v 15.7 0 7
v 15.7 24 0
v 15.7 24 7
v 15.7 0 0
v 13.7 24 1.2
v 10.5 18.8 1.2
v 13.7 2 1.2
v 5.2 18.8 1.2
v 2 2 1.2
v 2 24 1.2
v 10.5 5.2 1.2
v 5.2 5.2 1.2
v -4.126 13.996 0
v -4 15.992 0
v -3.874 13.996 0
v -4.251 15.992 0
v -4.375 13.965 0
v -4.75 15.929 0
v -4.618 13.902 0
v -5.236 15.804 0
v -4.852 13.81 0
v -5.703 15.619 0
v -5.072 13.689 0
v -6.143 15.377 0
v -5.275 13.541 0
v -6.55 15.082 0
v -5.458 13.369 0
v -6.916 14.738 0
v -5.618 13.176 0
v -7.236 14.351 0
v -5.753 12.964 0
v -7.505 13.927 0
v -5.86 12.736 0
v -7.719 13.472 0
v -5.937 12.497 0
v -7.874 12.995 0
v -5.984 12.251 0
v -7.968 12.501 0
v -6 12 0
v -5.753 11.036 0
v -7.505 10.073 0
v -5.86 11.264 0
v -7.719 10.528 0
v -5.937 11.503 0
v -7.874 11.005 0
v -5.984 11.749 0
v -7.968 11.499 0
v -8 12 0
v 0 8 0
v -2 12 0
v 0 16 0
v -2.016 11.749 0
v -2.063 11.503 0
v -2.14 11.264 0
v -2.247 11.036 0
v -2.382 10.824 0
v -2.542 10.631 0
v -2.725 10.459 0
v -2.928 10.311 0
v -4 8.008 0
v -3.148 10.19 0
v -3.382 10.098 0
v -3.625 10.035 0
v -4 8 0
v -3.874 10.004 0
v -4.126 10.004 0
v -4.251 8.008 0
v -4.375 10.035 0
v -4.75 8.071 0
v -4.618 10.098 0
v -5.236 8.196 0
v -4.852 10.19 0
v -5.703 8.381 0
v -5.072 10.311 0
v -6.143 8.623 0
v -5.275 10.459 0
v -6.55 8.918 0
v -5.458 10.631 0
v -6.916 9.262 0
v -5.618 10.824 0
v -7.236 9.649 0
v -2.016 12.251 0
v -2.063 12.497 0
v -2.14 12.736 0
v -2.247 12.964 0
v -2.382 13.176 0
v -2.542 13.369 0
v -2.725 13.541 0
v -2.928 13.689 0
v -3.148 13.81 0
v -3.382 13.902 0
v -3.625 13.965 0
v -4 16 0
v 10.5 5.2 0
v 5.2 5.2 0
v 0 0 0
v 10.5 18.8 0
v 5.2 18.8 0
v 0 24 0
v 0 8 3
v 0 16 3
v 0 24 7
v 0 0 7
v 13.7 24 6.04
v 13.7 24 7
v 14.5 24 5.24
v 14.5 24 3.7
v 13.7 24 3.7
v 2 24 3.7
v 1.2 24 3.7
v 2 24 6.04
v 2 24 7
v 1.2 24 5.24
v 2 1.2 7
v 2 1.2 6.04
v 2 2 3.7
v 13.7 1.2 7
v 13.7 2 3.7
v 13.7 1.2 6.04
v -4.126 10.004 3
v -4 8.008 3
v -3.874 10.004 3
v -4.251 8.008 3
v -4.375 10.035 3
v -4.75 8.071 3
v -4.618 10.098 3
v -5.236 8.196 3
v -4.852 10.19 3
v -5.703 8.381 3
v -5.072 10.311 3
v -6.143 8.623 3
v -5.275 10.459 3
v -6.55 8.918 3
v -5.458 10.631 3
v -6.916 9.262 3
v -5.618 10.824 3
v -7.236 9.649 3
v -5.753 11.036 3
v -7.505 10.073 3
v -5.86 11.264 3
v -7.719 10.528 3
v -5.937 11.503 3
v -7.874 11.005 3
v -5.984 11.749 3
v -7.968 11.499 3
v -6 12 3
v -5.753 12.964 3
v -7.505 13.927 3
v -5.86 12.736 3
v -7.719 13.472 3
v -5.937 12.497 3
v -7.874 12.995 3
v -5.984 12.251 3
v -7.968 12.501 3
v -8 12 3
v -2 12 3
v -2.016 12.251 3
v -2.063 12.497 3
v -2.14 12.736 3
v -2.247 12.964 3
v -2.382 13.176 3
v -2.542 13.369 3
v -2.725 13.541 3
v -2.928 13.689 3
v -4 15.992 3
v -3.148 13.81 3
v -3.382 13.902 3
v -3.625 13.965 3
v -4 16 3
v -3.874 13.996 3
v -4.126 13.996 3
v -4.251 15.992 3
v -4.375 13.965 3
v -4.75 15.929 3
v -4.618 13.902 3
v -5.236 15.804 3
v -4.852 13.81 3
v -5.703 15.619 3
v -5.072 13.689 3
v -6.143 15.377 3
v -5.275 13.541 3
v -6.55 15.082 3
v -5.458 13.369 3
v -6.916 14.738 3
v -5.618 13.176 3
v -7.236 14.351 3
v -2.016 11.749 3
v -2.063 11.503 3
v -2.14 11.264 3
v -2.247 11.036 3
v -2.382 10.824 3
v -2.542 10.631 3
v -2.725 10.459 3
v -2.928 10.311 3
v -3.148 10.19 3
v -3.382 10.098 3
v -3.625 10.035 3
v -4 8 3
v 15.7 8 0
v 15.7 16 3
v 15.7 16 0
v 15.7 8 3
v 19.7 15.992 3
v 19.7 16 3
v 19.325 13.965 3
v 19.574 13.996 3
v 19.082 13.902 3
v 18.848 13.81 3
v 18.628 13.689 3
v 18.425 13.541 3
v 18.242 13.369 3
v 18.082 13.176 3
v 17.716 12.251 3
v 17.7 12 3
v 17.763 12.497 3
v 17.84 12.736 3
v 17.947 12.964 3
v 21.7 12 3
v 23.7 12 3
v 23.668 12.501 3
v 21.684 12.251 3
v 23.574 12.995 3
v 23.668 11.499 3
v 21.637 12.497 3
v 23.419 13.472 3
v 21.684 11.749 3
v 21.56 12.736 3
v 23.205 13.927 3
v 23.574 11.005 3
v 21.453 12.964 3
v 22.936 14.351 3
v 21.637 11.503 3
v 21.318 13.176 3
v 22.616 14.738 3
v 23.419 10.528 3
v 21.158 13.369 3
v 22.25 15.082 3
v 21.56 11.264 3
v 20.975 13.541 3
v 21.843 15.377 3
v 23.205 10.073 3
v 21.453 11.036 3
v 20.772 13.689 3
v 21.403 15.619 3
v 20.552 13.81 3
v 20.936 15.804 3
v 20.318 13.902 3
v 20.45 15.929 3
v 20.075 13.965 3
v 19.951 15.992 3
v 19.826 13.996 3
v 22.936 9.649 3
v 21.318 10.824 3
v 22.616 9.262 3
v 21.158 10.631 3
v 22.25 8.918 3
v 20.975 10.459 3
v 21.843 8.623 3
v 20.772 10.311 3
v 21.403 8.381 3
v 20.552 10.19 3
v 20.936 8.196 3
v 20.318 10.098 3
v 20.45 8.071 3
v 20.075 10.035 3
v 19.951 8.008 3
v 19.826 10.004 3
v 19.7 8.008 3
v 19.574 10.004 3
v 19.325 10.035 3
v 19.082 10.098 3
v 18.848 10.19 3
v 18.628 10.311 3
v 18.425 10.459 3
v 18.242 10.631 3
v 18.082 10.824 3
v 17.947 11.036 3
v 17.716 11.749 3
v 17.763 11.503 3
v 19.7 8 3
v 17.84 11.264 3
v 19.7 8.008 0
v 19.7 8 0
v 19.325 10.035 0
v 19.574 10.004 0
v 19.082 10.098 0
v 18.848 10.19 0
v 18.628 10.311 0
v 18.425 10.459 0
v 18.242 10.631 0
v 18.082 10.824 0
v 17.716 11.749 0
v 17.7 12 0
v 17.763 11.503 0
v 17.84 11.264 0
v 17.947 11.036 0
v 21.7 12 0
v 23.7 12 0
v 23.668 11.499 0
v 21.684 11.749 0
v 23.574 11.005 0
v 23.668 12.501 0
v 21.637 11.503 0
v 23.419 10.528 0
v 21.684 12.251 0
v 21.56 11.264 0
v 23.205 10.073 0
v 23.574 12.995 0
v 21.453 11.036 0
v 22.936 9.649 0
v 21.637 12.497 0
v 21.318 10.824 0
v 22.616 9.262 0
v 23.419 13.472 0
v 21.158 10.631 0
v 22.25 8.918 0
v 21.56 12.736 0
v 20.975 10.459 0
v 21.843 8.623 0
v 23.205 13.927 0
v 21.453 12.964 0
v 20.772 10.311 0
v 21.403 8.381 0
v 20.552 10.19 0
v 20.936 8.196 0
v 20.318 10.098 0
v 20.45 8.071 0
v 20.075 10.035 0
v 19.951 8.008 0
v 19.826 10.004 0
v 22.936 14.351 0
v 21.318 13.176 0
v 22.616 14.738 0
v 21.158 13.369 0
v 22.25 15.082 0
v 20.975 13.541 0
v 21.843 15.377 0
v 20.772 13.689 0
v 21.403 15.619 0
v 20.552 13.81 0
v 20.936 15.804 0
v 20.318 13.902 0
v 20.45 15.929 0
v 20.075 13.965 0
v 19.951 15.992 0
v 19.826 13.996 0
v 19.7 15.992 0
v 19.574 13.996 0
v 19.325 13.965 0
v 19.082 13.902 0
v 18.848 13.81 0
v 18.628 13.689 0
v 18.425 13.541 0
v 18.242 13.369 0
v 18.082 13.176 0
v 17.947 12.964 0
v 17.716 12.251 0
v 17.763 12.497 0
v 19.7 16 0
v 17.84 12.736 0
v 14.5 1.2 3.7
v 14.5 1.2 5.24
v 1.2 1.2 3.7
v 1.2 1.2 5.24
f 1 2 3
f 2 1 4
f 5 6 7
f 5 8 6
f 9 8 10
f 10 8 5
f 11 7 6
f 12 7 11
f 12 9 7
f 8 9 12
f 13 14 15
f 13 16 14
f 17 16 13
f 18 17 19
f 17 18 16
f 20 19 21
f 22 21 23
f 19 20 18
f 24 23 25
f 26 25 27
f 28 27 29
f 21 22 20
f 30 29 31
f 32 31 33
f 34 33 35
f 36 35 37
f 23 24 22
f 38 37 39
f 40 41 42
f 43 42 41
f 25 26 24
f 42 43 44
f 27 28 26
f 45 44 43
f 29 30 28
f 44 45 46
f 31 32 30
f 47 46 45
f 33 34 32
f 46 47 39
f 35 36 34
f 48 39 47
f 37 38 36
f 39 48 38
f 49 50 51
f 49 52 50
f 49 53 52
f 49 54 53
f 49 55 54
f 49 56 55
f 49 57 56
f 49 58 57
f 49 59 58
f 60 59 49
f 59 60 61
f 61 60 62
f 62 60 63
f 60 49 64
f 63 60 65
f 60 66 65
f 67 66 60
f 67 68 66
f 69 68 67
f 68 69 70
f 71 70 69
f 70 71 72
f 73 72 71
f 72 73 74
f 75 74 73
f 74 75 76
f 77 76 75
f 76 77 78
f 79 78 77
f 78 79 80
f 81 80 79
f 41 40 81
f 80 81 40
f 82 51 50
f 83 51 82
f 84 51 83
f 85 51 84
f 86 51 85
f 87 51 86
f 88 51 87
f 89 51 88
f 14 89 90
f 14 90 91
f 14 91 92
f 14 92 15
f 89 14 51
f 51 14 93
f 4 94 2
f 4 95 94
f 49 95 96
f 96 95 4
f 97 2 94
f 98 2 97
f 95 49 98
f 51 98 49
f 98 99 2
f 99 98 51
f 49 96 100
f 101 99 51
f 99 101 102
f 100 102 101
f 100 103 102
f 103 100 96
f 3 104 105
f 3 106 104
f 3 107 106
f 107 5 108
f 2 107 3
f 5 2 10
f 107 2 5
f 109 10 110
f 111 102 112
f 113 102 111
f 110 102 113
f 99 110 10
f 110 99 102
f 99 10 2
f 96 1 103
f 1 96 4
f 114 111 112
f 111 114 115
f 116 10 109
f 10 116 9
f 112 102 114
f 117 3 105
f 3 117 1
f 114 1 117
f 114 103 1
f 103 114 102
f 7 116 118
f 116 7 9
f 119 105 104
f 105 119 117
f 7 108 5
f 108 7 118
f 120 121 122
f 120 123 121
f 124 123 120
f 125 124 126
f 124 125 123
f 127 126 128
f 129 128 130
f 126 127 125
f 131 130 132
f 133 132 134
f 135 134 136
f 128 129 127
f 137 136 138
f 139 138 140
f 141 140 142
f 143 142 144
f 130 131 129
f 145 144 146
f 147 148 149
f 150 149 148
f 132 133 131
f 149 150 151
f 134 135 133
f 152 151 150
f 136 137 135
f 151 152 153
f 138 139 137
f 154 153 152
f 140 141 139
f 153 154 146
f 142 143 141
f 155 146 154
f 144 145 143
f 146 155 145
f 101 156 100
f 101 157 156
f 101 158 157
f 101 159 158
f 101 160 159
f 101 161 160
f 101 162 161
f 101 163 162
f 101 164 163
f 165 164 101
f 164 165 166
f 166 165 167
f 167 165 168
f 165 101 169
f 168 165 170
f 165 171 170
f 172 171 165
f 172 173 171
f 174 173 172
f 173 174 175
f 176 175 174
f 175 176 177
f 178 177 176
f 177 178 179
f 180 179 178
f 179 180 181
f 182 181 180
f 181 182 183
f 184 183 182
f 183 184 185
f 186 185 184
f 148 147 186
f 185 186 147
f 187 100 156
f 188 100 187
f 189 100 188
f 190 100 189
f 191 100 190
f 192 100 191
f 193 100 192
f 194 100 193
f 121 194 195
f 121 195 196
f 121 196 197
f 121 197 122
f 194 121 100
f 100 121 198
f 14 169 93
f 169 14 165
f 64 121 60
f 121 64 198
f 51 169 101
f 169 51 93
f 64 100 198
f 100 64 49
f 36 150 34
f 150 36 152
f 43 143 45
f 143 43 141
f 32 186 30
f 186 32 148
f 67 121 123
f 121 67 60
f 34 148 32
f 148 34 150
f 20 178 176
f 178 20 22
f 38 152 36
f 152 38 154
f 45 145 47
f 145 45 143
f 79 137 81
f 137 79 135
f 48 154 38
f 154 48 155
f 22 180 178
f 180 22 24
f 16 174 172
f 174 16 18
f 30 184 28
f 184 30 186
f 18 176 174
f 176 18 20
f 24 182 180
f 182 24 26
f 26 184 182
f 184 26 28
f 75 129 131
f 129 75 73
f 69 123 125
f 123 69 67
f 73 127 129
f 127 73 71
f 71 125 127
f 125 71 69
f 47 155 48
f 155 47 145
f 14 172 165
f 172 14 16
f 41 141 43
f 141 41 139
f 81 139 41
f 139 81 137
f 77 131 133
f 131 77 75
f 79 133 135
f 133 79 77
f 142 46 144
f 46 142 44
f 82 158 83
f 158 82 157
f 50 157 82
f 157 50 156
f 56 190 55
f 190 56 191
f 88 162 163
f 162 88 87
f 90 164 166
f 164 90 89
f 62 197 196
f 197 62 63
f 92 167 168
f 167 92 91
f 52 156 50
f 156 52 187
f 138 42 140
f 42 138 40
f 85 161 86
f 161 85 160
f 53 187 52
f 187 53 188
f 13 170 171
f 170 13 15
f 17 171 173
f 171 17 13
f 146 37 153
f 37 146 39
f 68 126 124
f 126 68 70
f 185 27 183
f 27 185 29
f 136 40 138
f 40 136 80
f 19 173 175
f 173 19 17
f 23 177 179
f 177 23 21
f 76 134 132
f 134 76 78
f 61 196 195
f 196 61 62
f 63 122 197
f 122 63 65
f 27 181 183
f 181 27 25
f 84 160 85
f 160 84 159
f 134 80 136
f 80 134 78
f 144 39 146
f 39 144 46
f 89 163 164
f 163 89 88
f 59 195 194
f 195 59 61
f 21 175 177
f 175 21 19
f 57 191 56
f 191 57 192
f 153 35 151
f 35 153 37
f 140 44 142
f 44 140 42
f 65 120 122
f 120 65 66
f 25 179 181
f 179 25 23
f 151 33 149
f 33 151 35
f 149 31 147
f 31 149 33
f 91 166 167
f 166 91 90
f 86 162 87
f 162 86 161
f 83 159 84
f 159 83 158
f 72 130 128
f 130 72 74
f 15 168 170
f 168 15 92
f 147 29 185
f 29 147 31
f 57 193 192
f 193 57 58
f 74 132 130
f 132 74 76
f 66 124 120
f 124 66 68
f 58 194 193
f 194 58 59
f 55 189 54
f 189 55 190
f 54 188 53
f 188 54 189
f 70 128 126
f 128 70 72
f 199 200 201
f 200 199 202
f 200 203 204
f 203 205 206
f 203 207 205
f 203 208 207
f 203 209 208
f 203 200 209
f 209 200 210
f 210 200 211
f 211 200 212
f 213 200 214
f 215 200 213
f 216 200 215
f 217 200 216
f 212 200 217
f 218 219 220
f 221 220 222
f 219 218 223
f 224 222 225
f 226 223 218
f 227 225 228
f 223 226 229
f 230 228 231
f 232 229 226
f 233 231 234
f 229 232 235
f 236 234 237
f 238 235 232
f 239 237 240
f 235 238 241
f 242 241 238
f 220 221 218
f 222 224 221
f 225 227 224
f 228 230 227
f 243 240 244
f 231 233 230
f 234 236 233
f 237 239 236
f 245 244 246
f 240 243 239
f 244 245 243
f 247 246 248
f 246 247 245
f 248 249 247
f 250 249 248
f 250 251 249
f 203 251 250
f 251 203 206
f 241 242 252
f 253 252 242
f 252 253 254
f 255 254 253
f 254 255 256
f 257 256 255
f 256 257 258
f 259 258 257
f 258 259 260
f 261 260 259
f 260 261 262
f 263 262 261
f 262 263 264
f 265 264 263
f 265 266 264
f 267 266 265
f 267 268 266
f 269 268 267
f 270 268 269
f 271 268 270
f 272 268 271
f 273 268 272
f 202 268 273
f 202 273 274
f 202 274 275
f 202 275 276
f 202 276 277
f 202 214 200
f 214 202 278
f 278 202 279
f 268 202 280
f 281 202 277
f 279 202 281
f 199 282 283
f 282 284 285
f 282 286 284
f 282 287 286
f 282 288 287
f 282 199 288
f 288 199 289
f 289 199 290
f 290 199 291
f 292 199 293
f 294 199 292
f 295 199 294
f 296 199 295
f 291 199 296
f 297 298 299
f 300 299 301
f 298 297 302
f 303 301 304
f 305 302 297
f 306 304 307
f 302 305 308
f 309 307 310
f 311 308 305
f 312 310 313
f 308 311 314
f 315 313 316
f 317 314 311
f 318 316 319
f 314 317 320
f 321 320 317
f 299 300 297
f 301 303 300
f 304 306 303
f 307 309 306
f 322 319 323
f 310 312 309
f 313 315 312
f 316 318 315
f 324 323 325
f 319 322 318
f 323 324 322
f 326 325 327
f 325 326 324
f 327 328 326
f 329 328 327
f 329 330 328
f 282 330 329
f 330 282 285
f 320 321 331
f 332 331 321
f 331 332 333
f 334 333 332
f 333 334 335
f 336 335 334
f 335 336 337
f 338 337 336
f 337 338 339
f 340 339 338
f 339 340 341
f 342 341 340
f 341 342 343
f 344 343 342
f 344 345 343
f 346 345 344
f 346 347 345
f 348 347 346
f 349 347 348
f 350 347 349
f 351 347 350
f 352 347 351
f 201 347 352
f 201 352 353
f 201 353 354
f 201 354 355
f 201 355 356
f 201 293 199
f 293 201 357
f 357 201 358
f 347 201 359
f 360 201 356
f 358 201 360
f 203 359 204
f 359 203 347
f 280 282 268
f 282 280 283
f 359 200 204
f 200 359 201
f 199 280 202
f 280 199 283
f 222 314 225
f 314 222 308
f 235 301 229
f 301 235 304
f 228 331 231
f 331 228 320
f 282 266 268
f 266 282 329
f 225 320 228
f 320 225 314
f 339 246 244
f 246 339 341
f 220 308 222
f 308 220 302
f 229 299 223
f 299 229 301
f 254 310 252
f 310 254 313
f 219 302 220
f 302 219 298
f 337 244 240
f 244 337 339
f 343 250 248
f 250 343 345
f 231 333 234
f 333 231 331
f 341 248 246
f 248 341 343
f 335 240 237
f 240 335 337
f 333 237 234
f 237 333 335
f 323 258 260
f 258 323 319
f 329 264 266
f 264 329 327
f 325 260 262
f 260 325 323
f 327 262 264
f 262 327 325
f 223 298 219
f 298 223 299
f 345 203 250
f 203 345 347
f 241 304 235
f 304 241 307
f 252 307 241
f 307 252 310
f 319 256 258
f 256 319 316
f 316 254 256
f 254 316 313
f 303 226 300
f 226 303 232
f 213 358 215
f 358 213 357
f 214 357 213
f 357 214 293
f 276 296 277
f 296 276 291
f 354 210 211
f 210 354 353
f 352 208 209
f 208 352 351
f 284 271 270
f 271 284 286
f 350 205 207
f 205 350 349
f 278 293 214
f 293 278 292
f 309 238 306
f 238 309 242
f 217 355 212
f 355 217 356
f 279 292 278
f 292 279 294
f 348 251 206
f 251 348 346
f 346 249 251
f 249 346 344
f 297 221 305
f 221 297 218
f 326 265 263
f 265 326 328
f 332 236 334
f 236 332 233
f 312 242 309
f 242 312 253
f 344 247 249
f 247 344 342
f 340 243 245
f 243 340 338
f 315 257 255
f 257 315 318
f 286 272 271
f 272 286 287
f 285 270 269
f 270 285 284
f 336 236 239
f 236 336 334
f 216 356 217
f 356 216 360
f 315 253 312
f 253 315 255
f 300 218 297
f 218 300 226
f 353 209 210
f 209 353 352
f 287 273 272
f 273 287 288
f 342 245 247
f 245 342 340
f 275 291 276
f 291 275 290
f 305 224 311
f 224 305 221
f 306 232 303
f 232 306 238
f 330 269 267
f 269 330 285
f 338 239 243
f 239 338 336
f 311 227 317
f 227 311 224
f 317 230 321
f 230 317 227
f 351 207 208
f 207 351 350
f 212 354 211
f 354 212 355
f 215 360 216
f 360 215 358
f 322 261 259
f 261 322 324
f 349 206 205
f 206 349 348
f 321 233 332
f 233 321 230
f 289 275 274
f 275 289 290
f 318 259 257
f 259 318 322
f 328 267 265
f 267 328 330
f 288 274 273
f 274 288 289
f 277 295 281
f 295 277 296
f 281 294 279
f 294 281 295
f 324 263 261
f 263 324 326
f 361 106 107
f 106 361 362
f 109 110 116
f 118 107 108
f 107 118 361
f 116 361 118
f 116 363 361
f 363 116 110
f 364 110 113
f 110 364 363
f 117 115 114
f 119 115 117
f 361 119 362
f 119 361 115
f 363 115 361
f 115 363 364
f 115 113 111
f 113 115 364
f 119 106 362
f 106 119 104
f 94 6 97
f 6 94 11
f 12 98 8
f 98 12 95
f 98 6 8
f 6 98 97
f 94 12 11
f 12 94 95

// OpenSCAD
// file: ../lib/pcb_led_cvf.scad
// for led power module modified

/* bluetooth_mate_holder.scad
 * By John Biehler - November 17, 2011
 * http://www.thingiverse.com/thing:

 * derived from pcb_box_slide_with_tabs.scad
 * By Nicholas C Lewis - Jan 1, 2011
 * http://www.thingiverse.com/thing:5396
 *
 * derived from pcb_box_slide.scad
 *     Parametric, open PCB-box (slide-in) by chlunde
 *     http://www.thingiverse.com/thing:4071
 *
 * CHANGES
 * - adjusted to fit Arduino Mega
 * - added mounting tabs
 * - turned off cutouts
 * - adjusted bottom cutout size
 */

$fn=50;

module pcb_led_cvf(

	pcb_width = 48.2,
	pcb_length =24.1,
	pcb_height =1.1,
	slisse = 0.8,

	pcb_bottom_margin = 1,
	wall_width_thick = 2,
	box_height = 7,

	//tab parameters
	tab_hole_radius=2,
	tab_outer_radius=4,

	inner_margin = 4,

	add_tabs = true

) {
	wall_width = wall_width_thick-slisse;

module tab() {
	difference(){
		union() {
			translate([-tab_outer_radius,-tab_outer_radius,0])
			cube([tab_outer_radius,2*tab_outer_radius,wall_width_thick+1]);
			translate([-tab_outer_radius,0,0])
				cylinder(r=tab_outer_radius, h = wall_width_thick+1);
		}
		translate([-tab_outer_radius,0,0]) {
			cylinder(r= tab_hole_radius, h = wall_width_thick+5,center=true);
		}
	}

}

module box() {
	union() {
		cube([pcb_width + 2*wall_width, pcb_length + 2*wall_width, wall_width]);

		cube([wall_width_thick, pcb_length + 2*wall_width, box_height]);

		cube([pcb_width + 2*wall_width, wall_width_thick, box_height]);

		%translate([0, pcb_length+wall_width, 0])
			cube([pcb_width + 2*wall_width,wall_width,box_height]);

		translate([pcb_width + wall_width - slisse,0,0])
			cube([wall_width_thick, pcb_length + 2*wall_width, box_height]);
	}
	if(add_tabs) {
//comment out this part to remove tabs
		for(i=[(pcb_length + 2*wall_width)/2]){
	translate([0,i,0])tab();
	translate([pcb_width + 2*wall_width,i,0])mirror()tab();
		}
	}

}

module pcb() {
	translate([wall_width, wall_width, wall_width + pcb_bottom_margin])
		cube([pcb_width,pcb_length + wall_width + 0.1,pcb_height]);
	translate([wall_width, wall_width, wall_width + pcb_bottom_margin+pcb_height])rotate([0,45,0])
		cube([pcb_height,pcb_length + wall_width + 0.1,pcb_height]);
	translate([wall_width+pcb_width-2*cos(45)*pcb_height, wall_width, wall_width + pcb_bottom_margin+pcb_height])rotate([0,45,0])
		cube([pcb_height,pcb_length + wall_width + 0.1,pcb_height]);
	translate([wall_width_thick, wall_width, wall_width + pcb_bottom_margin])
		cube([pcb_width-2*slisse,pcb_length + wall_width + 0.1,box_height]);

}



module holes() {
		*translate([wall_width + pcb_width/2, wall_width_thick + 0.1, pcb_width/2+wall_width])
			rotate(a=90,v=[1,0,0])
				cylinder(r=pcb_width/2, h=wall_width_thick + 0.2);

		*translate([-0.1, wall_width + pcb_length/2, pcb_length/2 + wall_width])
			rotate(a=90,v=[0,1,0])
				cylinder(r=pcb_length/2, h=wall_width_thick + 0.2);

		*translate([pcb_width + wall_width - slisse - 0.1, wall_width + pcb_length/2, pcb_length/2 + wall_width])
			rotate(a=90,v=[0,1,0])
				cylinder(r=pcb_length/2, h=wall_width_thick + 0.2);

	 * translate([pcb_width/2 + wall_width, wall_width + pcb_length/2, -0.1])
			rotate(a=0,v=[0,1,0])
				cylinder(r=min(pcb_length,pcb_width)/2 - wall_width/2, h=wall_width_thick + 0.2);

		translate([inner_margin +wall_width, inner_margin+wall_width, -0.1])
			cube([pcb_width-inner_margin*2,pcb_length -inner_margin*2,wall_width + 0.2]);
}

	difference() {
		box();
		pcb();
		holes();
	}
}



pcb_led_cvf();
// main file
use <../lib/pcb_led_cvf.scad>


pcb_led_cvf(
  pcb_length=21.6,
  pcb_width=13.3,
  pcb_height=1.54,
  pcb_bottom_margin=2.5
);
